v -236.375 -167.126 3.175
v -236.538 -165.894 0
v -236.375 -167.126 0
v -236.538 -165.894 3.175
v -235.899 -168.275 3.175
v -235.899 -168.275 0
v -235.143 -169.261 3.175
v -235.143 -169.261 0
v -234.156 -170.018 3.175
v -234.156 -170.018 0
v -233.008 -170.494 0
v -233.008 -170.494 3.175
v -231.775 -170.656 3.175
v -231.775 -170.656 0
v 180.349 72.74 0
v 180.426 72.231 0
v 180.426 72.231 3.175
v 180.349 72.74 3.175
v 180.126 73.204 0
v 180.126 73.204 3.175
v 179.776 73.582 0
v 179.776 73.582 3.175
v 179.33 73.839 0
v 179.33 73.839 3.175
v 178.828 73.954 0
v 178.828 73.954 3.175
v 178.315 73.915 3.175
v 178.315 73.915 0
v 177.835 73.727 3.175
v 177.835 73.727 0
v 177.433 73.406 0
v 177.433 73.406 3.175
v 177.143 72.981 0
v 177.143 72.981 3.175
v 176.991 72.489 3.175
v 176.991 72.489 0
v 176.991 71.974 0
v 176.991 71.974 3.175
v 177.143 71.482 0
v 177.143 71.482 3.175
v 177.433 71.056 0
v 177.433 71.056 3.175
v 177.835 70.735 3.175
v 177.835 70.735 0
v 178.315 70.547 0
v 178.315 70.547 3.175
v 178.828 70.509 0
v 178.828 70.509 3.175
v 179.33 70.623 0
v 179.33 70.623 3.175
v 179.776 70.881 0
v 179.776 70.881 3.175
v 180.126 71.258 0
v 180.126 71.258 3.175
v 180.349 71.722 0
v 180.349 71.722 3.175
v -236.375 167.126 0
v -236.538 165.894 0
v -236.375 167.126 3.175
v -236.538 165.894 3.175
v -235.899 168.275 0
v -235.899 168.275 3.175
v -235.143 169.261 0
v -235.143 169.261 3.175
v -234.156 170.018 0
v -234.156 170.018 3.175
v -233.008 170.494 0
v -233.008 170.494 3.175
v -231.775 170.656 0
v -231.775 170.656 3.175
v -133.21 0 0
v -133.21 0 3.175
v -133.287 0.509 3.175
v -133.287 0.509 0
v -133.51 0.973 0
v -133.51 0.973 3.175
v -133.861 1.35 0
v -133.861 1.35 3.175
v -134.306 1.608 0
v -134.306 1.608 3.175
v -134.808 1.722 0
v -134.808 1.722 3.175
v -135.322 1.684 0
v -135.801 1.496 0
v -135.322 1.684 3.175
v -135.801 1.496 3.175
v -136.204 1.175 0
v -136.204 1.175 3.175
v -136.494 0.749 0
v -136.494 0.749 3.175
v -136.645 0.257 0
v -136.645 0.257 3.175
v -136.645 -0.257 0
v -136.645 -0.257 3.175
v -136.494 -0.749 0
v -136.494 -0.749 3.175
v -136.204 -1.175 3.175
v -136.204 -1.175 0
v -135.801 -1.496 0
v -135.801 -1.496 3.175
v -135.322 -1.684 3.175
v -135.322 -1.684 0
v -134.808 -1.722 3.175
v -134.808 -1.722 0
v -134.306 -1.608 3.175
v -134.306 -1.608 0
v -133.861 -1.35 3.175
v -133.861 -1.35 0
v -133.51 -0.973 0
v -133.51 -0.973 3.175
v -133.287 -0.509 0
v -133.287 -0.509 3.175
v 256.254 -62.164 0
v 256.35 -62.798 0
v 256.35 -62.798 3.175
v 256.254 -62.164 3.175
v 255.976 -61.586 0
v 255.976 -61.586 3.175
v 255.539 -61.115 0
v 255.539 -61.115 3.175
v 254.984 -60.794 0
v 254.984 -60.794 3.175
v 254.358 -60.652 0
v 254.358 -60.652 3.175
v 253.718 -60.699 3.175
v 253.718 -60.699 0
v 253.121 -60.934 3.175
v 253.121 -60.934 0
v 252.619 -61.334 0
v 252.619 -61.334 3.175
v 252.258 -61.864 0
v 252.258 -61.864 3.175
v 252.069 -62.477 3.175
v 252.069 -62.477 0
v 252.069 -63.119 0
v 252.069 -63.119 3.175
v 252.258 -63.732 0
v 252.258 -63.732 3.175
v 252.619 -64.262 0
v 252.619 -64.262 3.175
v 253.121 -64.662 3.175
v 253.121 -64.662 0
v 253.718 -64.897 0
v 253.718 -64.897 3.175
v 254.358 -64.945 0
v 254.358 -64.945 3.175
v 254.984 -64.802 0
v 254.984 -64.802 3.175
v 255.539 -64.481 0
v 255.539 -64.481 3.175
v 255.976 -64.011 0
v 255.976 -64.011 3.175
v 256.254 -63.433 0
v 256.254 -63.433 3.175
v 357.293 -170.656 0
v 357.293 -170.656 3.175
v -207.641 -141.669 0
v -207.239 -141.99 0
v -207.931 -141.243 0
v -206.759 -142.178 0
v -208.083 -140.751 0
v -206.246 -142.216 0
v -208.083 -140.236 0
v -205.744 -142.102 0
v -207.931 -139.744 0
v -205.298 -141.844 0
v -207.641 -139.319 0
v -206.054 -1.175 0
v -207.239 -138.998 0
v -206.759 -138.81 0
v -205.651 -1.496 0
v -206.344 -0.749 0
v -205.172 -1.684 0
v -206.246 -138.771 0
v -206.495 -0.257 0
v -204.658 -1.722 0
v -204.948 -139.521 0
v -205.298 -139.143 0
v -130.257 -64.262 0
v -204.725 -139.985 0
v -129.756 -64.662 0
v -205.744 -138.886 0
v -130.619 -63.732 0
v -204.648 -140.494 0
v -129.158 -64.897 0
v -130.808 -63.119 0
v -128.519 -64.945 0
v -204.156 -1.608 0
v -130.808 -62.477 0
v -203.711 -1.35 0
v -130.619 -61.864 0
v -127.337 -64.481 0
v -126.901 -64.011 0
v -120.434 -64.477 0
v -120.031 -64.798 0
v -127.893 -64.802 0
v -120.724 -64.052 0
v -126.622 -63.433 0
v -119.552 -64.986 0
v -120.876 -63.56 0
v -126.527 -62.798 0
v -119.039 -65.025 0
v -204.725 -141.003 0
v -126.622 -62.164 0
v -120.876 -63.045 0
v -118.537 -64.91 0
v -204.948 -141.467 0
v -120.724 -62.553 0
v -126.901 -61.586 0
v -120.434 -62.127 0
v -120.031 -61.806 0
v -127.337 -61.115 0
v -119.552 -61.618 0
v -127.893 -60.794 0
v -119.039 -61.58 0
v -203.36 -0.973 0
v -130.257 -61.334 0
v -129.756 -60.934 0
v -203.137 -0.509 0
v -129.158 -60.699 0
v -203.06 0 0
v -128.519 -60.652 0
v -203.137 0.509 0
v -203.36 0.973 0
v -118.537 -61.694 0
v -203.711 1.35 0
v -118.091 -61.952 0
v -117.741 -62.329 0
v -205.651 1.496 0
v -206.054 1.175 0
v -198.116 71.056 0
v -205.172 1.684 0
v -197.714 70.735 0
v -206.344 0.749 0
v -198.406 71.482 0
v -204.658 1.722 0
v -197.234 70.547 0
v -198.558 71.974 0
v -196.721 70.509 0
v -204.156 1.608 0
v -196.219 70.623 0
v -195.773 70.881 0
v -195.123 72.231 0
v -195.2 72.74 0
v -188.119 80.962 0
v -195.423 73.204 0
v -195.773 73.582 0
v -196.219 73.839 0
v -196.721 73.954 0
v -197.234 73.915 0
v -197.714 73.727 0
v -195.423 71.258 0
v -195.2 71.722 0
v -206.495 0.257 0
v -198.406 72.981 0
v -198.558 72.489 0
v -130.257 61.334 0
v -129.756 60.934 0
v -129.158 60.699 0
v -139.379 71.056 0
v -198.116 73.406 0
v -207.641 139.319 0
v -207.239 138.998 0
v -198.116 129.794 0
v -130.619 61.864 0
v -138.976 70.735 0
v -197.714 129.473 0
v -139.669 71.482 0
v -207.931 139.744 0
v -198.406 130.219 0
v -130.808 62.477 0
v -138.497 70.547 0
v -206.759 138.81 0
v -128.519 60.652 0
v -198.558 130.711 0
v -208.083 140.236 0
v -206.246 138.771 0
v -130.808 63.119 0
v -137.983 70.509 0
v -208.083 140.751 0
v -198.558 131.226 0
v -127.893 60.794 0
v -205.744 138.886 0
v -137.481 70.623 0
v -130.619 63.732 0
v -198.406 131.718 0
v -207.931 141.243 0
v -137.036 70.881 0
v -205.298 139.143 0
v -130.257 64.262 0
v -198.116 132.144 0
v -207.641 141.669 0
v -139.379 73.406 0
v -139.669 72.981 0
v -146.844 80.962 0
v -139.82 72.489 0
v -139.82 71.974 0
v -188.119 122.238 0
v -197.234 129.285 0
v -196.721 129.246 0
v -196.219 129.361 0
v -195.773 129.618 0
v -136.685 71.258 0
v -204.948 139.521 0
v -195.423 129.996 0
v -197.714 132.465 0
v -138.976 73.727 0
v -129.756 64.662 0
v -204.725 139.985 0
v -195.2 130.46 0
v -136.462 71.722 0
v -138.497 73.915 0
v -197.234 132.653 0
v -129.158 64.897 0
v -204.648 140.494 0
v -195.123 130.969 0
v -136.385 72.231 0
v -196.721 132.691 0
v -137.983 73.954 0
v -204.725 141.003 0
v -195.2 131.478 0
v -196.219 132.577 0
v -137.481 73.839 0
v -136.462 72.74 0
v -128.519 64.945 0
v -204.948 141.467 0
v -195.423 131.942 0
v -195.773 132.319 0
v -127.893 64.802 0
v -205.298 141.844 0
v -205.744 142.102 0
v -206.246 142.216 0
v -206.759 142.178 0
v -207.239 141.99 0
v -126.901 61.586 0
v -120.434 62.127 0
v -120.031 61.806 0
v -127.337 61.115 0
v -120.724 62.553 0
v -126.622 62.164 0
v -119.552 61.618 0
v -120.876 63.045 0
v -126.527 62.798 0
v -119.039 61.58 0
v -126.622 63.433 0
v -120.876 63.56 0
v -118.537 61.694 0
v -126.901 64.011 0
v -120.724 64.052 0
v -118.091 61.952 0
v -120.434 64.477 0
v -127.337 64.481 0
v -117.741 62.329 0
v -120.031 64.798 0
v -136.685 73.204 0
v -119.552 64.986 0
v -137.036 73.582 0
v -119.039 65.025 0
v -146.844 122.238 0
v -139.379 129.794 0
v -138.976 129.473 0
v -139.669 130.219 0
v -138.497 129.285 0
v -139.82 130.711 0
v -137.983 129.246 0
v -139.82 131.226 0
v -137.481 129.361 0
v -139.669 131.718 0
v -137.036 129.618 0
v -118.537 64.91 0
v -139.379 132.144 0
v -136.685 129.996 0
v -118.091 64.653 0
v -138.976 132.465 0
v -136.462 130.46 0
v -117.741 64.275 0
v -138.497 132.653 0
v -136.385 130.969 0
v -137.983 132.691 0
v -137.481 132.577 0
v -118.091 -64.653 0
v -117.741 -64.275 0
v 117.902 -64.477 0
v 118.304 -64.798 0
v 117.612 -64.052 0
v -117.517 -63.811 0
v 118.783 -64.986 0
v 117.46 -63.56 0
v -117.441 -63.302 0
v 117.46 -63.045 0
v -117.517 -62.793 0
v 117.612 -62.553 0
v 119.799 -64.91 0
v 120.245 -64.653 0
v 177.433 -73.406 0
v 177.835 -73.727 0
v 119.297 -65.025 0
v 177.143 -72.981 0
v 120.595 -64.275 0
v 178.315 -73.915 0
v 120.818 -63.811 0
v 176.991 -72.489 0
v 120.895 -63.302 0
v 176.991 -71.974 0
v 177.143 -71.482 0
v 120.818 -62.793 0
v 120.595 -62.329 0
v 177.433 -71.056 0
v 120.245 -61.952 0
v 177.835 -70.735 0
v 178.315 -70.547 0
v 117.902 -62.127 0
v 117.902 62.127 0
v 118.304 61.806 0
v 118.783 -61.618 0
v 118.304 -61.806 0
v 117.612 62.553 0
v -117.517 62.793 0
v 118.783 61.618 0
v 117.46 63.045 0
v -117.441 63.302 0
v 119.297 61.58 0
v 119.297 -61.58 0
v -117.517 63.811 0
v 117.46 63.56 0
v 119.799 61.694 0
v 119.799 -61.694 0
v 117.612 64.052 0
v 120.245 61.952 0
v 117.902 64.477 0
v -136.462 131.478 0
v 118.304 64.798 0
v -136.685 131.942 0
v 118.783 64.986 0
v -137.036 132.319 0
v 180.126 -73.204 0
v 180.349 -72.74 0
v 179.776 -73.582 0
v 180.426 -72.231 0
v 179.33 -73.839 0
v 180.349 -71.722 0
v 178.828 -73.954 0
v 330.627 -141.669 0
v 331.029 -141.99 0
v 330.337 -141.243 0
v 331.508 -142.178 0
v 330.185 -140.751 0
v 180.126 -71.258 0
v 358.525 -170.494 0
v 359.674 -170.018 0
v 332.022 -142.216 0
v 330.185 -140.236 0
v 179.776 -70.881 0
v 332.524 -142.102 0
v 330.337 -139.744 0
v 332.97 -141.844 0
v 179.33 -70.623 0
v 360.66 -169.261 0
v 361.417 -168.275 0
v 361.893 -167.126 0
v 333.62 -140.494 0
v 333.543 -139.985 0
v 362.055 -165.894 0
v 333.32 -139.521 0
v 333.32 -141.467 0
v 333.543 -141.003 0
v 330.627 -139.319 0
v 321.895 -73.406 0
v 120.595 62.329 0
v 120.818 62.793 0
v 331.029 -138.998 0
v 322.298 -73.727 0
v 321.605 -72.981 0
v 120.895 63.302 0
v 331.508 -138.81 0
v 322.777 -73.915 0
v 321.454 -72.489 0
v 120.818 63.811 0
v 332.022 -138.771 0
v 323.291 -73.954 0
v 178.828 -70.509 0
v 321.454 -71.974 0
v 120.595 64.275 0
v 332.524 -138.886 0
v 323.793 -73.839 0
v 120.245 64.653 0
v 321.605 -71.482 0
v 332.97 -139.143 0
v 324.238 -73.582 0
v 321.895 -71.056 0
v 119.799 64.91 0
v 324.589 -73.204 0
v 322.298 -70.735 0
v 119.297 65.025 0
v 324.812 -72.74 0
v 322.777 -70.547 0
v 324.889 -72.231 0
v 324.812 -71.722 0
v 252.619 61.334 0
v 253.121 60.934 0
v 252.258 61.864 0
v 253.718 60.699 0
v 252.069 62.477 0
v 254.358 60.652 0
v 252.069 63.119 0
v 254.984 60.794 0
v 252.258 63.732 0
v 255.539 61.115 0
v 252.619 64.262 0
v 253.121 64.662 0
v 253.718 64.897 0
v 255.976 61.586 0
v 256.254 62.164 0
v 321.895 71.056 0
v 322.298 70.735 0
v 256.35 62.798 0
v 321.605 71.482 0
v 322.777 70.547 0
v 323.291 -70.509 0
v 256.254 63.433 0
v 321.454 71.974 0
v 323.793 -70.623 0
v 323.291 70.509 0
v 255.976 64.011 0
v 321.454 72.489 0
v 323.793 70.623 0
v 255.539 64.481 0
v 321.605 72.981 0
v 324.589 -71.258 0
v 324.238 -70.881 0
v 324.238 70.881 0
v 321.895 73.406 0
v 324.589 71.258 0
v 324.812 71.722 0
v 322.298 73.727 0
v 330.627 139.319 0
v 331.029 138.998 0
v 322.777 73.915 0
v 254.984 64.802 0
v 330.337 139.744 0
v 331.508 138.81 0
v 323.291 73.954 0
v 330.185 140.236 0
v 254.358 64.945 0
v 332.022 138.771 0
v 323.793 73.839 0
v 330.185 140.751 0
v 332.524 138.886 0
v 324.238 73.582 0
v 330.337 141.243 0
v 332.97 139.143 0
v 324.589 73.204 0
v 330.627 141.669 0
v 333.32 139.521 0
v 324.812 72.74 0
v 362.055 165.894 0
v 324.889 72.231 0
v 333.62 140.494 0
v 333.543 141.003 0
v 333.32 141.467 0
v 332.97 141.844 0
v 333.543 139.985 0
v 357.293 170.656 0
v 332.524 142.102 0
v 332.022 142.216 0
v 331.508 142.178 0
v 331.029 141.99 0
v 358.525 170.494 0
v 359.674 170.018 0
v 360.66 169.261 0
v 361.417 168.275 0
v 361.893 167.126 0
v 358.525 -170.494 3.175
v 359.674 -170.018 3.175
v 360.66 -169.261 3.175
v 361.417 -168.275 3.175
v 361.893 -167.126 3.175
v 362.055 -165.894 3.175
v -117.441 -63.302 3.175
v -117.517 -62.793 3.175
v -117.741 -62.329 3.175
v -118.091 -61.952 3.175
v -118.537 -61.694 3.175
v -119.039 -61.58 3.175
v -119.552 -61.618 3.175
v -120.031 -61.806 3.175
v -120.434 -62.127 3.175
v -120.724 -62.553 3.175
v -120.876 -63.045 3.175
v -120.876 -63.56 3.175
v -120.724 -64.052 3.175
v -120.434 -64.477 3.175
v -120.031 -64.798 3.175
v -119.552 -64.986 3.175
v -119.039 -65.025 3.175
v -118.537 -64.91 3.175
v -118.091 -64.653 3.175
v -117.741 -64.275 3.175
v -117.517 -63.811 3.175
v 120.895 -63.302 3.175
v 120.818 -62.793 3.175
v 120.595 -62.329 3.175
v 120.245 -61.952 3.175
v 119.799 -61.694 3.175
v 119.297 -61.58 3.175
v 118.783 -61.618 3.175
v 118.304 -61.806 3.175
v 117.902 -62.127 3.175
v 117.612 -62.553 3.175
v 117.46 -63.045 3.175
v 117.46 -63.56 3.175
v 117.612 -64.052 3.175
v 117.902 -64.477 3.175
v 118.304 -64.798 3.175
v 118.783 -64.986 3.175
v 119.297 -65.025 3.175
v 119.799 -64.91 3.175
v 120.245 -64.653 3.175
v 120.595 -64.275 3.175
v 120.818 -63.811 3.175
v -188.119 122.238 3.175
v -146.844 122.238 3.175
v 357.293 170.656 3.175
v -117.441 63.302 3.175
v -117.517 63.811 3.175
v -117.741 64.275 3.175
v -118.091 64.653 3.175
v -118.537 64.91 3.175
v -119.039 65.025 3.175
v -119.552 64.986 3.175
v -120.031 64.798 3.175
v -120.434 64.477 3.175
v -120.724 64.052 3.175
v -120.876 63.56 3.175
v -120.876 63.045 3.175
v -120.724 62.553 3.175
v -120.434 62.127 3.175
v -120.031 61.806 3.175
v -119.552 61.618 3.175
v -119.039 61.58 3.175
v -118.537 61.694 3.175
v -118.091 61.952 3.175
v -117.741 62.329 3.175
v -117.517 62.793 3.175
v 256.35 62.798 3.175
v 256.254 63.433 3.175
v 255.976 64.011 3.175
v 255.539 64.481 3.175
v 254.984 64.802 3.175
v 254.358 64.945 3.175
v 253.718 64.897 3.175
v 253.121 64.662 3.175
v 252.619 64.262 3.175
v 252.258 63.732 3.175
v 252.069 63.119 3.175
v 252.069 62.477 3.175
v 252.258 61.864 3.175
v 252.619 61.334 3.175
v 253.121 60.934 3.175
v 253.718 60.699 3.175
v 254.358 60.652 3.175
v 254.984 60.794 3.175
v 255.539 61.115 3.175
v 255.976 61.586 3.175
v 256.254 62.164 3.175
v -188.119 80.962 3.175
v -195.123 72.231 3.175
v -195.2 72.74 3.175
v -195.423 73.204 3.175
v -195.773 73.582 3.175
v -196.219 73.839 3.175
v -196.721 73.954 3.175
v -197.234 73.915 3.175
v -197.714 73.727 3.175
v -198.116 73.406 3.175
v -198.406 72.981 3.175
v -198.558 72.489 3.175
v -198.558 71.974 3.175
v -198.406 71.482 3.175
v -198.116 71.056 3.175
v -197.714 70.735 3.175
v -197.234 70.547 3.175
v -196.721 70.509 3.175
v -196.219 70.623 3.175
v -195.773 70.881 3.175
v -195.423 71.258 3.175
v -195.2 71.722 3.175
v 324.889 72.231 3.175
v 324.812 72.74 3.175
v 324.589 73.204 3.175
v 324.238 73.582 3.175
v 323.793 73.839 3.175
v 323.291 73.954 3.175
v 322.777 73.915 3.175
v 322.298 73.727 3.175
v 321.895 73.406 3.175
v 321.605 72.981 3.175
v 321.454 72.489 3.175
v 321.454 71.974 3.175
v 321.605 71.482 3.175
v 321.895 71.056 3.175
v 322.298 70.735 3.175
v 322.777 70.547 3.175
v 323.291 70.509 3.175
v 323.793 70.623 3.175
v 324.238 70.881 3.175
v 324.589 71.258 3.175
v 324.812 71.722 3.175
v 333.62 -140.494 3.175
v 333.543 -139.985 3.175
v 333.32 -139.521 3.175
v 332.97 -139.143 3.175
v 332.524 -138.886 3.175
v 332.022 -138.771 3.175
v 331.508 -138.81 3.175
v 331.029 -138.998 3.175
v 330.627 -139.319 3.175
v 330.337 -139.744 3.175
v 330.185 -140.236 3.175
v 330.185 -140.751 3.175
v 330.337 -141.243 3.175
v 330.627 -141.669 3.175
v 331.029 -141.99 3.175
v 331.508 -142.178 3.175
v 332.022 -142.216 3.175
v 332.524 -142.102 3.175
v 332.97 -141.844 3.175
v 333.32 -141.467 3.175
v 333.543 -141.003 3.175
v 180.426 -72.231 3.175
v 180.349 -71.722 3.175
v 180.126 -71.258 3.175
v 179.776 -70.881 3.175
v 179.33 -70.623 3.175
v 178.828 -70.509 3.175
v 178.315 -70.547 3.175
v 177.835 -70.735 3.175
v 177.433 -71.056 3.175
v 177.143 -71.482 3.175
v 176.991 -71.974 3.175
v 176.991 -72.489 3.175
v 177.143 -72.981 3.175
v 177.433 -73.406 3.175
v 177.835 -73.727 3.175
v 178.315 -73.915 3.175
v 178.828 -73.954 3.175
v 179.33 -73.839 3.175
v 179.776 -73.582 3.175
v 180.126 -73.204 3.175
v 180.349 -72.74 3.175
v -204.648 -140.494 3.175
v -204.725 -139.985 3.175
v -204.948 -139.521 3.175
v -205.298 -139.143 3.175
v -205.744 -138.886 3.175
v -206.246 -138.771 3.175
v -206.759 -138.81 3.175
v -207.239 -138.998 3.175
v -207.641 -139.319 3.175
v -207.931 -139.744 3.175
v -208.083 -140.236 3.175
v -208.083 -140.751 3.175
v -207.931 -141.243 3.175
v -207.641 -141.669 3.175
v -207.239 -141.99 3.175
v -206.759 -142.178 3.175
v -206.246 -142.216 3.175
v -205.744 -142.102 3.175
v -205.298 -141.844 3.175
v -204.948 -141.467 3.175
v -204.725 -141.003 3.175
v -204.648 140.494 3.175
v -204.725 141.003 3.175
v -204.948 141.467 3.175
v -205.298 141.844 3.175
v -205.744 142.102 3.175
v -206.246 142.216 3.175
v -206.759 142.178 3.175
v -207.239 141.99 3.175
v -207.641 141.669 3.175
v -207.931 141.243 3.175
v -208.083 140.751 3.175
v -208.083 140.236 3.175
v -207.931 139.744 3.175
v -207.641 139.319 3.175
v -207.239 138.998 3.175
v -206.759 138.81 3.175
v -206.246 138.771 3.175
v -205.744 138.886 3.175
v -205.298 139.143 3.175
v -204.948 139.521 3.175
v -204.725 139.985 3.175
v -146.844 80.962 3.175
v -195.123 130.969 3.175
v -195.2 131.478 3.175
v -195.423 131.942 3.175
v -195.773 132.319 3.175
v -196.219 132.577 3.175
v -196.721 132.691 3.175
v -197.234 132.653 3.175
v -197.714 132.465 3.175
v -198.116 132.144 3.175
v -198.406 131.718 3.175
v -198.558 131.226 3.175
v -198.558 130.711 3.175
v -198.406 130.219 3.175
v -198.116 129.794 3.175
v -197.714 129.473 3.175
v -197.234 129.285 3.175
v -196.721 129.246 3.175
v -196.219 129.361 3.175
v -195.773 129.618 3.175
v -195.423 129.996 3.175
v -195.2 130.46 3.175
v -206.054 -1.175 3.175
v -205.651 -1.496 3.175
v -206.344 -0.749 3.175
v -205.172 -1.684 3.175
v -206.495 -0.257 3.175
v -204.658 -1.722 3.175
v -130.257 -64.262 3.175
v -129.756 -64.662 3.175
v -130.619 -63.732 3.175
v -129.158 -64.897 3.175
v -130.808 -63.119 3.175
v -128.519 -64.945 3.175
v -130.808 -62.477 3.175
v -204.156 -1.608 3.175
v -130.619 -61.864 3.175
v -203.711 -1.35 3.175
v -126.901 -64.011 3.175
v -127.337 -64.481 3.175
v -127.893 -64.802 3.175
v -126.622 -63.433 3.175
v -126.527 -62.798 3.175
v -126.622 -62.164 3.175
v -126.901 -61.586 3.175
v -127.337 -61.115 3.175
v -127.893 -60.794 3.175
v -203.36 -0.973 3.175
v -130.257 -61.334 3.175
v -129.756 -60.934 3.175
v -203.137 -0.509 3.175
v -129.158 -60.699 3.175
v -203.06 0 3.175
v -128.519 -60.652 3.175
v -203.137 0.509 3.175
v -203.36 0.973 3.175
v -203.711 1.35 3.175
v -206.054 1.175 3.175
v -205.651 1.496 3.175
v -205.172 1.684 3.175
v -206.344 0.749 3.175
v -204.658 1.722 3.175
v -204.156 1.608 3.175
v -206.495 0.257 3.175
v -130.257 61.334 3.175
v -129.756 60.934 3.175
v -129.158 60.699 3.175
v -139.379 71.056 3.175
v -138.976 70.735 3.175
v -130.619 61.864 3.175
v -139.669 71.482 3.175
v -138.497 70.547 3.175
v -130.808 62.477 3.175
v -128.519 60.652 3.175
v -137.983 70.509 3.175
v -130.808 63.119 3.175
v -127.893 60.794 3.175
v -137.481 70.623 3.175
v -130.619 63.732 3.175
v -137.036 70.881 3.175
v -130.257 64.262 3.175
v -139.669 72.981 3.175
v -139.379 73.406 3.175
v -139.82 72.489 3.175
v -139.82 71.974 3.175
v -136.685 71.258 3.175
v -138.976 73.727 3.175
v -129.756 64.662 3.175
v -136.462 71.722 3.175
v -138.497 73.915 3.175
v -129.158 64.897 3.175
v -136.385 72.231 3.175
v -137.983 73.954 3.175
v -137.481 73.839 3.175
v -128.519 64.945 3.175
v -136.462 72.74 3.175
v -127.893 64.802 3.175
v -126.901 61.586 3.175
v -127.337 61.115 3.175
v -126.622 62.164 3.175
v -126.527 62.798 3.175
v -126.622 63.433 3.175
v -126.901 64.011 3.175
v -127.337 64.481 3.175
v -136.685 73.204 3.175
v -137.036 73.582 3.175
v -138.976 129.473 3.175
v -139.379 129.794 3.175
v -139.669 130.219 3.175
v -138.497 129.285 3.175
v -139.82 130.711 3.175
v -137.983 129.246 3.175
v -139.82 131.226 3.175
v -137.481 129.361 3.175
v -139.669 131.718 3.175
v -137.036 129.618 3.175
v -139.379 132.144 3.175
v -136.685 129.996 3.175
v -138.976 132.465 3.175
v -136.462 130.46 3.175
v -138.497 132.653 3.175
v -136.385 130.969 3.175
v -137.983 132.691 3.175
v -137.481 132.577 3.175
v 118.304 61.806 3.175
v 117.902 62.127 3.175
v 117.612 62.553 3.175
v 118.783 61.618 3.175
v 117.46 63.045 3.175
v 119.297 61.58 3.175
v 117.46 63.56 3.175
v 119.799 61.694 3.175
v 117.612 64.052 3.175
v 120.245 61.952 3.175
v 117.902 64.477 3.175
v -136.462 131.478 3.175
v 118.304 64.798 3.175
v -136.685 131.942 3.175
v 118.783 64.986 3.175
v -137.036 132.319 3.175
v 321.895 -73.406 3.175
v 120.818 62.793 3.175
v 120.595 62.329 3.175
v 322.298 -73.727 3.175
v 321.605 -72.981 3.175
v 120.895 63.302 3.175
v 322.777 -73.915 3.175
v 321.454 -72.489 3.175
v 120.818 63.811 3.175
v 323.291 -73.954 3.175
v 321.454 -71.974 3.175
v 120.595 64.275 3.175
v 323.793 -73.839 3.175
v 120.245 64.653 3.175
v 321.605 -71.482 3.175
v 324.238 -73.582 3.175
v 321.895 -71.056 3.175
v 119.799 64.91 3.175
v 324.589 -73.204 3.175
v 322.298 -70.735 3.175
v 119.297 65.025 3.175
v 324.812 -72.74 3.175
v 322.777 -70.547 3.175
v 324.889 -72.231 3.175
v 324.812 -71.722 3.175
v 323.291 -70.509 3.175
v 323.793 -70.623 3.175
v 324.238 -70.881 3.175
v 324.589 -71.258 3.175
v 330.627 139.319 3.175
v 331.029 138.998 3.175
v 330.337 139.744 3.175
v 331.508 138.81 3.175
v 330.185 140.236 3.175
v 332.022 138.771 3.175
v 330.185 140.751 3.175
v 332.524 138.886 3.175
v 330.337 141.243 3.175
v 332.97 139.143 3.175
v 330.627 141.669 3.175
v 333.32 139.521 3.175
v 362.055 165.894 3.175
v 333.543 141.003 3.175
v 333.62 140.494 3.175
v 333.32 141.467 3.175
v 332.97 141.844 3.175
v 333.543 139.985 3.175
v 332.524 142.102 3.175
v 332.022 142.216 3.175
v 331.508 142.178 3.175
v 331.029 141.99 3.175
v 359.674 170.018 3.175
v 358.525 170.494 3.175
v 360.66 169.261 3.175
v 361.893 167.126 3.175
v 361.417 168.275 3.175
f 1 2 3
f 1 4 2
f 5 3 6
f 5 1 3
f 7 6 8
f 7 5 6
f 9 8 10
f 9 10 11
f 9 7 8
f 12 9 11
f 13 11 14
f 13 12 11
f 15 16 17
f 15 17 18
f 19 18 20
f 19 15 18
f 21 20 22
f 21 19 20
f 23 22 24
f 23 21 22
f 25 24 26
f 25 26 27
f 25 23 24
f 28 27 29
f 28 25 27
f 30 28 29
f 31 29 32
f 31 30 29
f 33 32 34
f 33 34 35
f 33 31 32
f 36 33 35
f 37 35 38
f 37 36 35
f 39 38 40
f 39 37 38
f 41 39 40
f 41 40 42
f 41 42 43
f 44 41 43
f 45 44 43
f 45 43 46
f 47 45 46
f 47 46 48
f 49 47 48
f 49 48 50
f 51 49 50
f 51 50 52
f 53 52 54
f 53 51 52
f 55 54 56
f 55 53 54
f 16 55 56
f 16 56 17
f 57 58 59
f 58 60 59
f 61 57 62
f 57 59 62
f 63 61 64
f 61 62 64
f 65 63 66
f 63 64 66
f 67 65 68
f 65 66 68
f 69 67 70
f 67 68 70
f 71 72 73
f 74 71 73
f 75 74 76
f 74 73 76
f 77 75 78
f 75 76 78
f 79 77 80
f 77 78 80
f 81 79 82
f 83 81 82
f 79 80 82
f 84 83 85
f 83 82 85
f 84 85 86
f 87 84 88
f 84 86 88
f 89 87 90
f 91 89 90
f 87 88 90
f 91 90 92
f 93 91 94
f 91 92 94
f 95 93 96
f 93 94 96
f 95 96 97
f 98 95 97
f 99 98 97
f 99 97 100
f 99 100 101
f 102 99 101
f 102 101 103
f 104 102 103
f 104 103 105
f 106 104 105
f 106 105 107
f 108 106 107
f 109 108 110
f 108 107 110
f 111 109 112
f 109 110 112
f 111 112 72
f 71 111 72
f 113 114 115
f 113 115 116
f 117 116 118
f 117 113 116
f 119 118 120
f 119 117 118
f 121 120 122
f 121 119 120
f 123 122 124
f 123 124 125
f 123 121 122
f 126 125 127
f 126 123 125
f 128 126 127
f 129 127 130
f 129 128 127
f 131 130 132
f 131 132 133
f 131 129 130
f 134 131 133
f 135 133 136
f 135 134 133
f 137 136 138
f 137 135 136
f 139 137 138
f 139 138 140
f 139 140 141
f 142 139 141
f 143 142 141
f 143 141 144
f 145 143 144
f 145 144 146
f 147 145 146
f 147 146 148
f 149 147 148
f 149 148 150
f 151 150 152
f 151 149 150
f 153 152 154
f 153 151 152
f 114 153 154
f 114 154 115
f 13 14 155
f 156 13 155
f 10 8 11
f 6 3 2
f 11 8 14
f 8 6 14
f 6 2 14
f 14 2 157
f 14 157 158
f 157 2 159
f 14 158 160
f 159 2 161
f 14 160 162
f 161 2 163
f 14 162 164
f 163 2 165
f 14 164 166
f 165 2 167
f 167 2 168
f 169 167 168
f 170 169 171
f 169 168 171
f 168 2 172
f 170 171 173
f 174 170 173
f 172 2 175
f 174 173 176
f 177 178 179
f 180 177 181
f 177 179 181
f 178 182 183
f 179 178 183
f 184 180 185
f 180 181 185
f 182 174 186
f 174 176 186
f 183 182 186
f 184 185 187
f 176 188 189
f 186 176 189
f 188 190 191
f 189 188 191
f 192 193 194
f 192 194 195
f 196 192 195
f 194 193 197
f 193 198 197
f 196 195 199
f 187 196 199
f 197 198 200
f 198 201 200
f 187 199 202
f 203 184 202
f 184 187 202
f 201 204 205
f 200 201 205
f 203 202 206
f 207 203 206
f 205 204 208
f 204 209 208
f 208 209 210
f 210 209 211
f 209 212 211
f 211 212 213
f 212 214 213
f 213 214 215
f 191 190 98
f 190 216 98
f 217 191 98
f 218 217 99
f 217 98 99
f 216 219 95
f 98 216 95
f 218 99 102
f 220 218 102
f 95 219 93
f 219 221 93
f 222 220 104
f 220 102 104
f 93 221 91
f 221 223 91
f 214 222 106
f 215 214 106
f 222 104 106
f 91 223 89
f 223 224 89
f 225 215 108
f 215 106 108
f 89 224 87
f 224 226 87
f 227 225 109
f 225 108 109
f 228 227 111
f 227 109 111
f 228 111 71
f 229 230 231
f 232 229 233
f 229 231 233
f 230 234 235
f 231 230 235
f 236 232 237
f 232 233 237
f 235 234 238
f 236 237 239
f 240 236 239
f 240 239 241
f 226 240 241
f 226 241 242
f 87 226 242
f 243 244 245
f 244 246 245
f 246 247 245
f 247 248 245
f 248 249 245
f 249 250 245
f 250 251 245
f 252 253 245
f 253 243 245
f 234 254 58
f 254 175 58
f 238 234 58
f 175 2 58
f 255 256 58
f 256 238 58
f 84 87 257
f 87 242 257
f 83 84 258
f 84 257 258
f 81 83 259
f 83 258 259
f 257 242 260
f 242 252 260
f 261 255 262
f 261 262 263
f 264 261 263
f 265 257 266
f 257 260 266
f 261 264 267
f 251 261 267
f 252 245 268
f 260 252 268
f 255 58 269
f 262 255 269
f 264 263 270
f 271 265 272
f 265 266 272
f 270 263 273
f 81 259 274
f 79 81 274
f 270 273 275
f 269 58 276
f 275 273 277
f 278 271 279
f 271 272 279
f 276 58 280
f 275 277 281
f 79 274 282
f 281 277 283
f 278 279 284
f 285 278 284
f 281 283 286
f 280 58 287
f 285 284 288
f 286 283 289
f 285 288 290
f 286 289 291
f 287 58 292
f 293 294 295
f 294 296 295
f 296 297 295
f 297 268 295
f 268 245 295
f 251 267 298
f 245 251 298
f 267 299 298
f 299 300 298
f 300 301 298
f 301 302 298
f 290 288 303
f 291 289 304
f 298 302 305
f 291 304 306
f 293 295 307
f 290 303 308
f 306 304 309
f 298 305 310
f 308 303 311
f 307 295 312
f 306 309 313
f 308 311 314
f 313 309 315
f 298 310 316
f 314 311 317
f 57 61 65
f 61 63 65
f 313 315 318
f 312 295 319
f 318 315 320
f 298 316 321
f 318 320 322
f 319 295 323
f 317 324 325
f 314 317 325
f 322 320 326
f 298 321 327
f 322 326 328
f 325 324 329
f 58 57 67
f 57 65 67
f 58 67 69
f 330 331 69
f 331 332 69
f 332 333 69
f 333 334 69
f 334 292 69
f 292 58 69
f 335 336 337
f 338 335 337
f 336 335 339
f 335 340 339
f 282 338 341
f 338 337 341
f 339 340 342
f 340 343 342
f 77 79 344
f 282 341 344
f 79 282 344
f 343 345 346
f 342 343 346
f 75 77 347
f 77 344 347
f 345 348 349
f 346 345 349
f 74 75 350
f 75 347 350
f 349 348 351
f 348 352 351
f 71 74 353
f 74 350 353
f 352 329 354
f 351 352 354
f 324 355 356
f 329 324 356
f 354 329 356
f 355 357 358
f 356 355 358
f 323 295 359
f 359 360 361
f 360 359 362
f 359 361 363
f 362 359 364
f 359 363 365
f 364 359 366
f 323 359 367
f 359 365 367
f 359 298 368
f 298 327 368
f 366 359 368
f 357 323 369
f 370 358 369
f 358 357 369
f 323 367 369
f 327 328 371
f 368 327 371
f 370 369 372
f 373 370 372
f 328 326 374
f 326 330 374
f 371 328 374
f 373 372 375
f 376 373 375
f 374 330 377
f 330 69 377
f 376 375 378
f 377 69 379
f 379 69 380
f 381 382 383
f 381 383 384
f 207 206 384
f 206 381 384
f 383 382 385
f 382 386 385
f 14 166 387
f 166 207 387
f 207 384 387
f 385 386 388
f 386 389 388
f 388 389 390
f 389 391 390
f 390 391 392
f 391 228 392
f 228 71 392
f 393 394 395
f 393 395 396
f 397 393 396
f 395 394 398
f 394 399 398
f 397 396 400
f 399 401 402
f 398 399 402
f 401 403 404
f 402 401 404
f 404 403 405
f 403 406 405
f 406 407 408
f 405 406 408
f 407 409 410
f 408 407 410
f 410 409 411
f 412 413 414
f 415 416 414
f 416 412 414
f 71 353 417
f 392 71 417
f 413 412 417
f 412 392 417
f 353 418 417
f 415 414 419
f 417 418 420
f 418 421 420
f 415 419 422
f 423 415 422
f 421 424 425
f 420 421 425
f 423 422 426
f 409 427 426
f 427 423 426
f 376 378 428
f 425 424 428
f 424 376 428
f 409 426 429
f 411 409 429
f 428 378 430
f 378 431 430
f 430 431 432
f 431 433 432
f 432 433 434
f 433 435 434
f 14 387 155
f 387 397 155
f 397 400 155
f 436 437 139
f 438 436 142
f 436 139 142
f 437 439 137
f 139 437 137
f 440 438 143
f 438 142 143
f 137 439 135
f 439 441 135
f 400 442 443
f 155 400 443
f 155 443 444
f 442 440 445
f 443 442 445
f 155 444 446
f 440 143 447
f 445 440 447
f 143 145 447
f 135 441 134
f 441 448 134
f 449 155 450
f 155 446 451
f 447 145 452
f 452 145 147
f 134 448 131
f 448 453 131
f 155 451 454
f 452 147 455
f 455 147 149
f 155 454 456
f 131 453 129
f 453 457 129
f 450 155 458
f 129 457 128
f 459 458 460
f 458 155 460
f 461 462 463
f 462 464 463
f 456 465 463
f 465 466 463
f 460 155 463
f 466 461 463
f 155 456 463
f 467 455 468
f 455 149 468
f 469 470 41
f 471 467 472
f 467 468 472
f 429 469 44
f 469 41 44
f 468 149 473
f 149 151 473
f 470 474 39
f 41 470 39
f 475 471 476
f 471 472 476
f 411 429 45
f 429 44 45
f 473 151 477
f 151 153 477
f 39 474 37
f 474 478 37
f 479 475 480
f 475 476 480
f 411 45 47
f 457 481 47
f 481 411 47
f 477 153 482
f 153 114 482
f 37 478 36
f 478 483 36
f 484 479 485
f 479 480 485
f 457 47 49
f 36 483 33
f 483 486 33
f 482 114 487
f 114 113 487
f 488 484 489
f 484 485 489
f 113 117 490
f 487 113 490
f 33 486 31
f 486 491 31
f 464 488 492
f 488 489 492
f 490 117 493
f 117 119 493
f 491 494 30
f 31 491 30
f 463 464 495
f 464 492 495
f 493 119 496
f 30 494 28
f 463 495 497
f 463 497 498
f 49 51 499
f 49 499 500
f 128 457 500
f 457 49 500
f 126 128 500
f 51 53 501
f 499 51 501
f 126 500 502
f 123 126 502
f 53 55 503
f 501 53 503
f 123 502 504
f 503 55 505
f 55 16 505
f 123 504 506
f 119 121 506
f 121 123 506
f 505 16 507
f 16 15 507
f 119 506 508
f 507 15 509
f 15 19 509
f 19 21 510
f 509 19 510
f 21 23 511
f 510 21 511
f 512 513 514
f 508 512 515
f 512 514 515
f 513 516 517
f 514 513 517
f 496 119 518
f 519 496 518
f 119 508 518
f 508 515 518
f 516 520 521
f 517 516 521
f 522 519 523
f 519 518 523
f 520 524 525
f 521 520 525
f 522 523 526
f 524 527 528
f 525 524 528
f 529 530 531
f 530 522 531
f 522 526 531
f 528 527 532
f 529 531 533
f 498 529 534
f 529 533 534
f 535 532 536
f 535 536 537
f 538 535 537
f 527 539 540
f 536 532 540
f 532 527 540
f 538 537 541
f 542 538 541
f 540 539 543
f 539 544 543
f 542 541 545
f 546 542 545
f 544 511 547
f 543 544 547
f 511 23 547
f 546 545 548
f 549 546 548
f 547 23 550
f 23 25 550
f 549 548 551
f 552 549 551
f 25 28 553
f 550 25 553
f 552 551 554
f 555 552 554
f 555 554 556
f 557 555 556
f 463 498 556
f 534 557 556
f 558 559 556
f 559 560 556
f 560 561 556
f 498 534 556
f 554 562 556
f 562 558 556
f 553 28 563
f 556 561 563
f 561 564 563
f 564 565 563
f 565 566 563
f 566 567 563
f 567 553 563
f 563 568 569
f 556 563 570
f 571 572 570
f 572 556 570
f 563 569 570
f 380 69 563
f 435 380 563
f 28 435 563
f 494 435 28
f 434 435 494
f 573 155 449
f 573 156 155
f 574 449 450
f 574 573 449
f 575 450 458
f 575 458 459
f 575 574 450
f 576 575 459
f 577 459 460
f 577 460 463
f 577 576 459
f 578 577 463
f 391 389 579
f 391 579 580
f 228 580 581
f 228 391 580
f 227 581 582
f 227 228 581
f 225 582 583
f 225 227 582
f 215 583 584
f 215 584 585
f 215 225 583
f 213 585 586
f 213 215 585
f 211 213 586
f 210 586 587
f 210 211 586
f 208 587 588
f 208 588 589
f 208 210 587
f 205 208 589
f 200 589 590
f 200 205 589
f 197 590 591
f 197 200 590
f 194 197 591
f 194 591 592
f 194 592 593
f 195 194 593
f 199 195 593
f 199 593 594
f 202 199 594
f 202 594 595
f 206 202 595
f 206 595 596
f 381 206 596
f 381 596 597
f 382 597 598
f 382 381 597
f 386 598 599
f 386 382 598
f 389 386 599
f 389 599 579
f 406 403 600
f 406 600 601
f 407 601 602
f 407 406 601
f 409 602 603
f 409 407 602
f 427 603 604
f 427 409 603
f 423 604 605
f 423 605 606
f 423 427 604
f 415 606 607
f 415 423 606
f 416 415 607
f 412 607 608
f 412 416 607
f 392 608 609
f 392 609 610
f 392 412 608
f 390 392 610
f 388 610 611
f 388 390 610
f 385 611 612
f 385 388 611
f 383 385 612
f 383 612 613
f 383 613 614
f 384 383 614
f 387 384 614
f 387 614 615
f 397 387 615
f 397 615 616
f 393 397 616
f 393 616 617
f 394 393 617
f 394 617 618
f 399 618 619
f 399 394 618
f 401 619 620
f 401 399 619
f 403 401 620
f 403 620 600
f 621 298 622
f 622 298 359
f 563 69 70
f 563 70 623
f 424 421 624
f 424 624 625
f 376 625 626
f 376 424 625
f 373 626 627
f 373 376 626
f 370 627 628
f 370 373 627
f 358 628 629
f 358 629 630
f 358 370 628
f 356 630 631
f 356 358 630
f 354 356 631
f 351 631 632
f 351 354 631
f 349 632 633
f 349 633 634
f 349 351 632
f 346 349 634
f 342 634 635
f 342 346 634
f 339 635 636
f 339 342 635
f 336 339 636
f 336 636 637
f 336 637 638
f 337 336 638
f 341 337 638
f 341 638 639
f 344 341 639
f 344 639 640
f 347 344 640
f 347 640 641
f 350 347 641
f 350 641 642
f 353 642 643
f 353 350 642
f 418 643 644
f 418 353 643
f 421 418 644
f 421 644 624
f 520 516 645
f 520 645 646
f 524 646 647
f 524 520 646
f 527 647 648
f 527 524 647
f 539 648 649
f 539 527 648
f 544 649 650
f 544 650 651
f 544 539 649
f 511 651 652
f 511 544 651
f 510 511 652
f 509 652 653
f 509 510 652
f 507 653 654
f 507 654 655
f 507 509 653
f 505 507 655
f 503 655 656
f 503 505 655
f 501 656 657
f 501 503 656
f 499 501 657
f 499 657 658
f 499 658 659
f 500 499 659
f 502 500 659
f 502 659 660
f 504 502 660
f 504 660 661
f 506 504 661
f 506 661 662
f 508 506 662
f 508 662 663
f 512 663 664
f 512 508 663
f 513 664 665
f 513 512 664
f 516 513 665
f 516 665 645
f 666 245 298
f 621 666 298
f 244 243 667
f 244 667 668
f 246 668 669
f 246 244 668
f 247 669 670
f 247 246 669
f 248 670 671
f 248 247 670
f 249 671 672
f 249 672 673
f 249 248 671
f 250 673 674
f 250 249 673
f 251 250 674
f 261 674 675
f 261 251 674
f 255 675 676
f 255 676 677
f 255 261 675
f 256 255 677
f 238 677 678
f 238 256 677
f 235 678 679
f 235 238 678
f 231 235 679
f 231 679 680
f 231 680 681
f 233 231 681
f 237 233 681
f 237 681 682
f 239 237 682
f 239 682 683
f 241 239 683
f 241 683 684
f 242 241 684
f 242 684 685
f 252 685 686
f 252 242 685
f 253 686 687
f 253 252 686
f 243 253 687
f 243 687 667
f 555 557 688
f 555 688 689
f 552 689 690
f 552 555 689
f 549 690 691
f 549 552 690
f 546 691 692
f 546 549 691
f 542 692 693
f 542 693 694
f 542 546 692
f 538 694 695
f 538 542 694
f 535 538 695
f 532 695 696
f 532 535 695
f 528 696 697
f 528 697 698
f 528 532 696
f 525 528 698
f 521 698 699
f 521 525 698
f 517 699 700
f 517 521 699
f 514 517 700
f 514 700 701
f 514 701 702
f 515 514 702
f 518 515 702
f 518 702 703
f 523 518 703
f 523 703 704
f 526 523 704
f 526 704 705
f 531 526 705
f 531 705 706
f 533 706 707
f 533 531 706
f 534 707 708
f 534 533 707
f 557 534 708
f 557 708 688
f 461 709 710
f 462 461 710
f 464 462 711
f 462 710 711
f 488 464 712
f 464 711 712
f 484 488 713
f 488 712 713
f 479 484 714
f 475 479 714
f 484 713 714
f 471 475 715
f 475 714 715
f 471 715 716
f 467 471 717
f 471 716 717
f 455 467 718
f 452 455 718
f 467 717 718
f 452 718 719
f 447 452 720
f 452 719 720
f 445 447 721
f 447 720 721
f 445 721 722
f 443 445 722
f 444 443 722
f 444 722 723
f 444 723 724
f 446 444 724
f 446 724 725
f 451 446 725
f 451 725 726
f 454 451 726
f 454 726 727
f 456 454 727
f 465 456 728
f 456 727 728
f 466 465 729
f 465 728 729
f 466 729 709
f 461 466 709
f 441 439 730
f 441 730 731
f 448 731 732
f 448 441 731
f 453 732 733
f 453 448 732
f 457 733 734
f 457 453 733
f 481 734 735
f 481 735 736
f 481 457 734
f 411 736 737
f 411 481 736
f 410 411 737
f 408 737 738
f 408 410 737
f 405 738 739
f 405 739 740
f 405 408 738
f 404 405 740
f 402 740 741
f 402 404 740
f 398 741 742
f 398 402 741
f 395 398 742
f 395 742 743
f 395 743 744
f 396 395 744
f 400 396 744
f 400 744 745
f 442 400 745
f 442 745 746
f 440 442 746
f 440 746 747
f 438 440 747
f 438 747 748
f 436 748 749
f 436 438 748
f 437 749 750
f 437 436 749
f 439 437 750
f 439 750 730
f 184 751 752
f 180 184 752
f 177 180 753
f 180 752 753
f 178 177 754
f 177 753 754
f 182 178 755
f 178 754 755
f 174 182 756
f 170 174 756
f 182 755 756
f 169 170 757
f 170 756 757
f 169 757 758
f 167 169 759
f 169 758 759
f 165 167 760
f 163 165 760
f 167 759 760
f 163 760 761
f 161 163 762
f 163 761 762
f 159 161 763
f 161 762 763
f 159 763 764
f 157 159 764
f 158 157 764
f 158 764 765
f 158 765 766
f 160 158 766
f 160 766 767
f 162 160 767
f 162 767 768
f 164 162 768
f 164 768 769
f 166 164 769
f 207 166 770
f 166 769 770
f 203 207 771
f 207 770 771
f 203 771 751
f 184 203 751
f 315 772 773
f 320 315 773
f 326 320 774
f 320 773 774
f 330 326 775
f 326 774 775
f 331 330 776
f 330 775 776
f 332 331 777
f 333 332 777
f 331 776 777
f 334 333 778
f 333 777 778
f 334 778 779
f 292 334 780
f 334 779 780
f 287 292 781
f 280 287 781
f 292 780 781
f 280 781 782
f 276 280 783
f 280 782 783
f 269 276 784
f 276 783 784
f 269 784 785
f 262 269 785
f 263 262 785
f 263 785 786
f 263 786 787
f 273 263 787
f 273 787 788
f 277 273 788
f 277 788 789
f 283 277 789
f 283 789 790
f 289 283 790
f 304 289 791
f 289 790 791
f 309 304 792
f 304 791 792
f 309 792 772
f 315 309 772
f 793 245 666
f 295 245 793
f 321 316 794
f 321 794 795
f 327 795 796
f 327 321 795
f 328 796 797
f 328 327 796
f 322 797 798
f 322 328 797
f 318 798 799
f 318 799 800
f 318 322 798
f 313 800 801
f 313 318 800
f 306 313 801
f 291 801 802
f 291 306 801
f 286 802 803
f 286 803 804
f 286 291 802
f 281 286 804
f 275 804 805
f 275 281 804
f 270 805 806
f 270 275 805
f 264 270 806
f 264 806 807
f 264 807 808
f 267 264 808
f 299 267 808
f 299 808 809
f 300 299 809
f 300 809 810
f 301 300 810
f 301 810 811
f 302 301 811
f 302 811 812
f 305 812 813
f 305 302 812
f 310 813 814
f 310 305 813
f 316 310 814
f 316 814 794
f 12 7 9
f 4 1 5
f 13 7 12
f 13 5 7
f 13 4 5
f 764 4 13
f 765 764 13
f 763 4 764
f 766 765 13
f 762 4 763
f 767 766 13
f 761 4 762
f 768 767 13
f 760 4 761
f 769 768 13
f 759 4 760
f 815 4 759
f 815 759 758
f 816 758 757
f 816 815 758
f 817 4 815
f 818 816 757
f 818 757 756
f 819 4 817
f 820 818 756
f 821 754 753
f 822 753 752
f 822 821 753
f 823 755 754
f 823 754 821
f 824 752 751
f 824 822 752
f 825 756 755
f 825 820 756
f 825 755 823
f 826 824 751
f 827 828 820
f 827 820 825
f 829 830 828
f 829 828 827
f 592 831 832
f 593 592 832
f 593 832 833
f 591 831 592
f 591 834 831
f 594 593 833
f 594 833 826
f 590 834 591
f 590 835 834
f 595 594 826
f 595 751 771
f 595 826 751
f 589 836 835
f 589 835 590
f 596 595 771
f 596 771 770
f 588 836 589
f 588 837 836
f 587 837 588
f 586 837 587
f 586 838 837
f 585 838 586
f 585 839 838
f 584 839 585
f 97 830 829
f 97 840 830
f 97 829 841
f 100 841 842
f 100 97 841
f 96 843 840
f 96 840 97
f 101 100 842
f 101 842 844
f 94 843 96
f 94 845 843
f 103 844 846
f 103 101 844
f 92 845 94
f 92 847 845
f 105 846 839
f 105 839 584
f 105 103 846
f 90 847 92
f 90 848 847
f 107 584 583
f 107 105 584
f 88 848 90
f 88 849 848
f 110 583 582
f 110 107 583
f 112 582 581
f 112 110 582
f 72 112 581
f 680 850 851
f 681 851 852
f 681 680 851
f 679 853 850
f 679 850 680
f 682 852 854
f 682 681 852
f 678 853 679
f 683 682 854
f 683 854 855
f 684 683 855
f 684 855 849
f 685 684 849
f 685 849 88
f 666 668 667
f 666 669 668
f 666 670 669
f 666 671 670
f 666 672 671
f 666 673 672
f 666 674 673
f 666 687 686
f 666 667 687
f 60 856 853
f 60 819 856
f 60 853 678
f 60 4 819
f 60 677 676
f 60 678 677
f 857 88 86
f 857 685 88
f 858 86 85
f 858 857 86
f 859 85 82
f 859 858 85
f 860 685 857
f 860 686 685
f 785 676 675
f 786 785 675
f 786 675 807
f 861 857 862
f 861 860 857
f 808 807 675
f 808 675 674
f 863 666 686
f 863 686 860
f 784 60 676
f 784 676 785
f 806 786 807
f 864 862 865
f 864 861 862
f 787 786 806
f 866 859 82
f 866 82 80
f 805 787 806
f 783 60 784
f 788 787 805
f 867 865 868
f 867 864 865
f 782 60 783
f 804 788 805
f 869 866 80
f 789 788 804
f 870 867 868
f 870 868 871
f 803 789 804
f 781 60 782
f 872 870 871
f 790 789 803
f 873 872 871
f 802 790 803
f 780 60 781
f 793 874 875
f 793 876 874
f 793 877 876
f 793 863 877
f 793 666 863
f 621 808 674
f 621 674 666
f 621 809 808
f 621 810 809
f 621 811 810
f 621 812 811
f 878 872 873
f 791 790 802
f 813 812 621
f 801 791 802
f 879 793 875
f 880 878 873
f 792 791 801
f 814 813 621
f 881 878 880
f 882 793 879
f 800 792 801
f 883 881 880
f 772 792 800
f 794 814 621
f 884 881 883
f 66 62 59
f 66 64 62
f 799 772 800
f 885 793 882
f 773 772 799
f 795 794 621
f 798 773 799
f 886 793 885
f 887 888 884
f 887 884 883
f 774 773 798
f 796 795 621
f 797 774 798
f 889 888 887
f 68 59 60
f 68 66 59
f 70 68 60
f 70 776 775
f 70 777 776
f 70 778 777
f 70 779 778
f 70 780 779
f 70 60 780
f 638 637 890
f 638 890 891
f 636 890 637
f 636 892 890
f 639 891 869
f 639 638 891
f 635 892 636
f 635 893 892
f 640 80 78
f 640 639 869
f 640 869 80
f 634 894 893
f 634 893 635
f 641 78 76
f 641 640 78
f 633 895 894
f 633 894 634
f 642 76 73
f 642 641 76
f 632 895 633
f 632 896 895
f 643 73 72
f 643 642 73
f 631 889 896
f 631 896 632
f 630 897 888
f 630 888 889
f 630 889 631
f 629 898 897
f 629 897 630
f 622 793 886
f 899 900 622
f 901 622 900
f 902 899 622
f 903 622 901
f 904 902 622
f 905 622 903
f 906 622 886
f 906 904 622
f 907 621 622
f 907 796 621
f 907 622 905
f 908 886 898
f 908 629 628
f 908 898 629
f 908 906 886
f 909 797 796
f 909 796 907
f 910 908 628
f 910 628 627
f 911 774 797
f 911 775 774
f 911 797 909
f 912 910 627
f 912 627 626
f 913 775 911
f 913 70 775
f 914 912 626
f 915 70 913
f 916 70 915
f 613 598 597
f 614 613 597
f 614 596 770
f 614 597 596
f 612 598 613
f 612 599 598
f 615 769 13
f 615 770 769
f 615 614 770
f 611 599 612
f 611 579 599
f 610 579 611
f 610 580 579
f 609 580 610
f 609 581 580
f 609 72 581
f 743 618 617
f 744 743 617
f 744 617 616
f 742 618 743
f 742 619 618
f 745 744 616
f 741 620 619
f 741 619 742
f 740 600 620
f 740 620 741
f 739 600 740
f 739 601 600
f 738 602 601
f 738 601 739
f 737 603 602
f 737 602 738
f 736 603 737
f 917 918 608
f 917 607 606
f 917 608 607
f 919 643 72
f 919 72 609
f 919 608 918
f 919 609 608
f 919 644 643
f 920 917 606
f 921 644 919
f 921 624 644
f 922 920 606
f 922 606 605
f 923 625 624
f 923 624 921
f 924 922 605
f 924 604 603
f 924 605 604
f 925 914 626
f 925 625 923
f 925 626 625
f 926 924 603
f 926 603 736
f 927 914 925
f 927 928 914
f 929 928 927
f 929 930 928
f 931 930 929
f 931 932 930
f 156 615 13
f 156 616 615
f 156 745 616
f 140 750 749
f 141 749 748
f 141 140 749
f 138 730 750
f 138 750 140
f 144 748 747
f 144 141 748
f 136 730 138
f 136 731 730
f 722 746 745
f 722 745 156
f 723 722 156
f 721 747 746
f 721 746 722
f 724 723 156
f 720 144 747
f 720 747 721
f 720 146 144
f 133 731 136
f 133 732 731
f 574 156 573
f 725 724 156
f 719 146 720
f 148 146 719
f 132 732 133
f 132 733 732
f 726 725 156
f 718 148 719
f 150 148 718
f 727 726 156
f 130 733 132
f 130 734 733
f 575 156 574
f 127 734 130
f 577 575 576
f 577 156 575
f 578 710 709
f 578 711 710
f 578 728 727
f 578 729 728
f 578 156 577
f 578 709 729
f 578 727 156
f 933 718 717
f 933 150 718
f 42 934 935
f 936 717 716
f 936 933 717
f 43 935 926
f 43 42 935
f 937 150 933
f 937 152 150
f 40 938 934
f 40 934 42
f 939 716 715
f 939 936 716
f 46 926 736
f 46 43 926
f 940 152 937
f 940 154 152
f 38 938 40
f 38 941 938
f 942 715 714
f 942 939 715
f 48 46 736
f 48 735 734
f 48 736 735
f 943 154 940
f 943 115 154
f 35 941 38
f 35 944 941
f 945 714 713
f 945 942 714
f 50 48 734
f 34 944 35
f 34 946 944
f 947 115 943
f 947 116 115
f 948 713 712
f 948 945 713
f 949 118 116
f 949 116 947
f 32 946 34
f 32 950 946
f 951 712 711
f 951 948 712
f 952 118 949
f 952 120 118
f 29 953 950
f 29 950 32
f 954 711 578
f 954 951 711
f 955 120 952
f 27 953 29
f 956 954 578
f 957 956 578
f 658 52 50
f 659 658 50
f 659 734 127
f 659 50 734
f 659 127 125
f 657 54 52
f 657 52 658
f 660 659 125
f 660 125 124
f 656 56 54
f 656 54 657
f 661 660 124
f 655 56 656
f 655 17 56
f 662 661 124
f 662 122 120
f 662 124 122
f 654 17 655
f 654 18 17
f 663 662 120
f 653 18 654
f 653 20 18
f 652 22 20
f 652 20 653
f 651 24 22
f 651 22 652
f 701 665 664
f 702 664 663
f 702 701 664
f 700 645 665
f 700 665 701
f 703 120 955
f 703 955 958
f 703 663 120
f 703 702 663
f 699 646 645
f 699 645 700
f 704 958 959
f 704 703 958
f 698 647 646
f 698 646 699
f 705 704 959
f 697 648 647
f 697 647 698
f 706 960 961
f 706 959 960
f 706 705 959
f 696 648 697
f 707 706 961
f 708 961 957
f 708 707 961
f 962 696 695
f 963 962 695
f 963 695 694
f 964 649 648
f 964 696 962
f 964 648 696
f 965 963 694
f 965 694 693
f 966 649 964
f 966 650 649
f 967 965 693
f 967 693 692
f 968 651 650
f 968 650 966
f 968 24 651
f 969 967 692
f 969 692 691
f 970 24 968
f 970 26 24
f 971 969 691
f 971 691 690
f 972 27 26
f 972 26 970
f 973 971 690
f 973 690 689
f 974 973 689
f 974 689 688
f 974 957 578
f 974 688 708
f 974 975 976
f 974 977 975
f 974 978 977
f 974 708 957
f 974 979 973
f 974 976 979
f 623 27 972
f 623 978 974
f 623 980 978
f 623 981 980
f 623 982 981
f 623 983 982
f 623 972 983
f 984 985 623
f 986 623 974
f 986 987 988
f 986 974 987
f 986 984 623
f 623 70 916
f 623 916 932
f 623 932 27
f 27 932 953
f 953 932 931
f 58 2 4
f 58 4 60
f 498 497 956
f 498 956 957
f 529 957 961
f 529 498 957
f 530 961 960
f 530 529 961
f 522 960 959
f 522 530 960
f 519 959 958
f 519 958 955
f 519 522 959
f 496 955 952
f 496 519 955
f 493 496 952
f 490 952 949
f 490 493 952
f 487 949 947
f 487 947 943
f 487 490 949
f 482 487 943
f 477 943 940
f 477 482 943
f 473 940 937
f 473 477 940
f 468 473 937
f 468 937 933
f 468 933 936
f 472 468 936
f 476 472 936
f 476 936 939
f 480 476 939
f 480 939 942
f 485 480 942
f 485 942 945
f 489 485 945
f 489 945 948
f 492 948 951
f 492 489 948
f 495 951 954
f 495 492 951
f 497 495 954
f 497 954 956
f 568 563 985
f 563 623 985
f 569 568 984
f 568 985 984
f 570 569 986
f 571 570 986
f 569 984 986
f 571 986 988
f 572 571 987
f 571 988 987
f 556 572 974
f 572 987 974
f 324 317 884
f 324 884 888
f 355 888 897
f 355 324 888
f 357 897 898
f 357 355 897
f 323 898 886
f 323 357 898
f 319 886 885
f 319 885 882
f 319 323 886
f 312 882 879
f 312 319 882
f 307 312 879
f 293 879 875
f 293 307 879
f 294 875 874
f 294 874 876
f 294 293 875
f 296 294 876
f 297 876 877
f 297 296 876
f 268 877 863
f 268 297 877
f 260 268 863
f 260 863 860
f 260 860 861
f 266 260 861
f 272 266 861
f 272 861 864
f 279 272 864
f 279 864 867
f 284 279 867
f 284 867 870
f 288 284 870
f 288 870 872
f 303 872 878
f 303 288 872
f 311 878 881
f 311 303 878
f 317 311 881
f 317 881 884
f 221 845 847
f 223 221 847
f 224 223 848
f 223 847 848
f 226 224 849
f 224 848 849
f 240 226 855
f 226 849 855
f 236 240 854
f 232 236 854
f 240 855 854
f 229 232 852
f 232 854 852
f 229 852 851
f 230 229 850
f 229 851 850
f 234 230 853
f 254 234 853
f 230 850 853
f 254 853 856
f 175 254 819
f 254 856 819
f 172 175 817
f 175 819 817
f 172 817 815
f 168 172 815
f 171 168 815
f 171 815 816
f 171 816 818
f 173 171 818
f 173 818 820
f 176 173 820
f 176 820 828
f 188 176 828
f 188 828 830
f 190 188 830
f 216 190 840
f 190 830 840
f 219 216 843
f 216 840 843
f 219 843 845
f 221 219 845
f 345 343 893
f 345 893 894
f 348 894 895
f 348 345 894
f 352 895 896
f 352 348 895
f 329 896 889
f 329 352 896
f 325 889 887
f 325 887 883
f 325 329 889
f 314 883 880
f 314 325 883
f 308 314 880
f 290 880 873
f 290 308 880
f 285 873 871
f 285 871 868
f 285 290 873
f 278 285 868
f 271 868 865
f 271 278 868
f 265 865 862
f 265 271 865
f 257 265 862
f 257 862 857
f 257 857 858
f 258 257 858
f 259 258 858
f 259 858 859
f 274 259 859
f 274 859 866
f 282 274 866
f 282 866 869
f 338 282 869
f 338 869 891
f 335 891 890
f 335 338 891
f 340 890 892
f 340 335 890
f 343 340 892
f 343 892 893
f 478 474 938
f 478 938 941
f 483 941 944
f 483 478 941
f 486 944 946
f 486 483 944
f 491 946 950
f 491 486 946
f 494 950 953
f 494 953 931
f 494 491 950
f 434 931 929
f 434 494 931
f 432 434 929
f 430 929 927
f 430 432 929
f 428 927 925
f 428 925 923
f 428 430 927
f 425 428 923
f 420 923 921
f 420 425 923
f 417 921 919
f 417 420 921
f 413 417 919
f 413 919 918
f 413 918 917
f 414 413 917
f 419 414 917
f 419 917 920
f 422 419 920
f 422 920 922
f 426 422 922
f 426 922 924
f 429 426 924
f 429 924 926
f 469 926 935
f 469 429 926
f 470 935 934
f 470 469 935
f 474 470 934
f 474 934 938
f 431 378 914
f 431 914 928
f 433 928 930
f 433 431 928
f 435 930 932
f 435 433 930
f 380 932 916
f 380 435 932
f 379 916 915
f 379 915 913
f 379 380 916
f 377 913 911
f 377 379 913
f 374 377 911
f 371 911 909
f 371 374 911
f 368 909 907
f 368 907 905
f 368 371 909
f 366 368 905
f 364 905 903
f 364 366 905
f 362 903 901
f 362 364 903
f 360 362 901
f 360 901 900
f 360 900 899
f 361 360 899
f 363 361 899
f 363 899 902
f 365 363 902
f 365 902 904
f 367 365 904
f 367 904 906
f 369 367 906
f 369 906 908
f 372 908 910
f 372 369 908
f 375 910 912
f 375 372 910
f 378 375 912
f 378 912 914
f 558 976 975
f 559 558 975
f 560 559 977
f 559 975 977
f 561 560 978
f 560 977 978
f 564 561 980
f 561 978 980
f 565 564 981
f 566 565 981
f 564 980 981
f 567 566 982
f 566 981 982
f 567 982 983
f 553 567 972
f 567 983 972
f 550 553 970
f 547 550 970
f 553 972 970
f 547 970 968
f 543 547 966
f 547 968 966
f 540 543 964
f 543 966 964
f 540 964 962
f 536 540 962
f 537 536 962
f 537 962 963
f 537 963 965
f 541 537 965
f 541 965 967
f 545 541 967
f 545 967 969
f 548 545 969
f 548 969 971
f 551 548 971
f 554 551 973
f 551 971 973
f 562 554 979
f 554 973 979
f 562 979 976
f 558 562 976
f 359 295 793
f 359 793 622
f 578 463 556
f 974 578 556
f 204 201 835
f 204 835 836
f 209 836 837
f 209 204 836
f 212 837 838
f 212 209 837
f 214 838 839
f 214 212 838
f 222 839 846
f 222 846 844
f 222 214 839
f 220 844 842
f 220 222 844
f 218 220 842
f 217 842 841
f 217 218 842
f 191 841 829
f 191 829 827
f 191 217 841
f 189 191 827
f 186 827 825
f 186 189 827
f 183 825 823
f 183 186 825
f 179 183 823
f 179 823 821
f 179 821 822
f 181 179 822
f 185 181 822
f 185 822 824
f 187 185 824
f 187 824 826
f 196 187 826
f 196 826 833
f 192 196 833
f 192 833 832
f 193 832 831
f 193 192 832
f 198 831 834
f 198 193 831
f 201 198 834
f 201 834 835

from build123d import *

# Parameters (mm, degrees)
F0_W     = 598.5927433312
F0_H     = 341.3125
F0_R     = 2.15265
F0_R_2   = 1.7272
F0_W_2   = 41.275
F0_H_2   = 41.275
F1_DEPTH = 3.175
F3_R     = 4.7625
F2_R     = 1.7272
F4_DEPTH = 3.175
F5_R     = 1.7272
F6_DEPTH = 3.175


with BuildPart() as f1:
    # F0 (on Top) → F1 (new body)
    with BuildSketch(Plane.XY):
        with Locations((62.7588716656, 0)):
            Rectangle(F0_W, F0_H)
        with Locations((-128.6793928788, -62.7981428788)):
            Circle(F0_R, mode=Mode.SUBTRACT)
        with Locations((-119.1677433312, -63.3022737)):
            Circle(F0_R_2, mode=Mode.SUBTRACT)
        with Locations((119.1677433312, -63.3022737)):
            Circle(F0_R_2, mode=Mode.SUBTRACT)
        with Locations((178.6989933312, -72.23125)):
            Circle(F0_R_2, mode=Mode.SUBTRACT)
        with Locations((254.19713621, -62.7981428788)):
            Circle(F0_R, mode=Mode.SUBTRACT)
        with Locations((323.1614933312, -72.23125)):
            Circle(F0_R_2, mode=Mode.SUBTRACT)
        with Locations((-196.85, 72.23125)):
            Circle(F0_R_2, mode=Mode.SUBTRACT)
        with Locations((-128.6793928788, 62.7981428788)):
            Circle(F0_R, mode=Mode.SUBTRACT)
        with Locations((-119.1677433312, 63.3022737)):
            Circle(F0_R_2, mode=Mode.SUBTRACT)
        with Locations((-138.1125, 72.23125)):
            Circle(F0_R_2, mode=Mode.SUBTRACT)
        with Locations((-167.48125, 101.6)):
            Rectangle(F0_W_2, F0_H_2, mode=Mode.SUBTRACT)
        with Locations((-196.85, 130.96875)):
            Circle(F0_R_2, mode=Mode.SUBTRACT)
        with Locations((-138.1125, 130.96875)):
            Circle(F0_R_2, mode=Mode.SUBTRACT)
        with Locations((119.1677433312, 63.3022737)):
            Circle(F0_R_2, mode=Mode.SUBTRACT)
        with Locations((178.6989933312, 72.23125)):
            Circle(F0_R_2, mode=Mode.SUBTRACT)
        with Locations((254.19713621, 62.7981428788)):
            Circle(F0_R, mode=Mode.SUBTRACT)
        with Locations((323.1614933312, 72.23125)):
            Circle(F0_R_2, mode=Mode.SUBTRACT)
    extrude(amount=F1_DEPTH)

    # F3
    f3_edges = [f1.edges().sort_by_distance(p)[0] for p in [
        (362.055243, -170.65625, 1.5875),
        (-236.5375, -170.65625, 1.5875),
        (-236.5375, 170.65625, 1.5875),
        (362.055243, 170.65625, 1.5875),
    ]]
    fillet(f3_edges, radius=F3_R)

    # F2 (on face) → F4 (cut, through all)
    with BuildSketch(Plane.XY.offset(3.175)):
        with Locations((-206.375, -140.49375)):
            Circle(F2_R)
        with Locations((-206.375, 140.49375)):
            Circle(F2_R)
        with Locations((331.8927433312, 140.49375)):
            Circle(F2_R)
        with Locations((331.8927433312, -140.49375)):
            Circle(F2_R)
    extrude(amount=-F4_DEPTH, mode=Mode.SUBTRACT)

    # F5 (on face) → F6 (cut, through all)
    with BuildSketch(Plane.XY.offset(3.175)):
        with Locations((-134.9374857312, 0)):
            Circle(F5_R)
        with Locations((-204.7875, 0)):
            Circle(F5_R)
    extrude(amount=-F6_DEPTH, mode=Mode.SUBTRACT)


solid = f1.part
